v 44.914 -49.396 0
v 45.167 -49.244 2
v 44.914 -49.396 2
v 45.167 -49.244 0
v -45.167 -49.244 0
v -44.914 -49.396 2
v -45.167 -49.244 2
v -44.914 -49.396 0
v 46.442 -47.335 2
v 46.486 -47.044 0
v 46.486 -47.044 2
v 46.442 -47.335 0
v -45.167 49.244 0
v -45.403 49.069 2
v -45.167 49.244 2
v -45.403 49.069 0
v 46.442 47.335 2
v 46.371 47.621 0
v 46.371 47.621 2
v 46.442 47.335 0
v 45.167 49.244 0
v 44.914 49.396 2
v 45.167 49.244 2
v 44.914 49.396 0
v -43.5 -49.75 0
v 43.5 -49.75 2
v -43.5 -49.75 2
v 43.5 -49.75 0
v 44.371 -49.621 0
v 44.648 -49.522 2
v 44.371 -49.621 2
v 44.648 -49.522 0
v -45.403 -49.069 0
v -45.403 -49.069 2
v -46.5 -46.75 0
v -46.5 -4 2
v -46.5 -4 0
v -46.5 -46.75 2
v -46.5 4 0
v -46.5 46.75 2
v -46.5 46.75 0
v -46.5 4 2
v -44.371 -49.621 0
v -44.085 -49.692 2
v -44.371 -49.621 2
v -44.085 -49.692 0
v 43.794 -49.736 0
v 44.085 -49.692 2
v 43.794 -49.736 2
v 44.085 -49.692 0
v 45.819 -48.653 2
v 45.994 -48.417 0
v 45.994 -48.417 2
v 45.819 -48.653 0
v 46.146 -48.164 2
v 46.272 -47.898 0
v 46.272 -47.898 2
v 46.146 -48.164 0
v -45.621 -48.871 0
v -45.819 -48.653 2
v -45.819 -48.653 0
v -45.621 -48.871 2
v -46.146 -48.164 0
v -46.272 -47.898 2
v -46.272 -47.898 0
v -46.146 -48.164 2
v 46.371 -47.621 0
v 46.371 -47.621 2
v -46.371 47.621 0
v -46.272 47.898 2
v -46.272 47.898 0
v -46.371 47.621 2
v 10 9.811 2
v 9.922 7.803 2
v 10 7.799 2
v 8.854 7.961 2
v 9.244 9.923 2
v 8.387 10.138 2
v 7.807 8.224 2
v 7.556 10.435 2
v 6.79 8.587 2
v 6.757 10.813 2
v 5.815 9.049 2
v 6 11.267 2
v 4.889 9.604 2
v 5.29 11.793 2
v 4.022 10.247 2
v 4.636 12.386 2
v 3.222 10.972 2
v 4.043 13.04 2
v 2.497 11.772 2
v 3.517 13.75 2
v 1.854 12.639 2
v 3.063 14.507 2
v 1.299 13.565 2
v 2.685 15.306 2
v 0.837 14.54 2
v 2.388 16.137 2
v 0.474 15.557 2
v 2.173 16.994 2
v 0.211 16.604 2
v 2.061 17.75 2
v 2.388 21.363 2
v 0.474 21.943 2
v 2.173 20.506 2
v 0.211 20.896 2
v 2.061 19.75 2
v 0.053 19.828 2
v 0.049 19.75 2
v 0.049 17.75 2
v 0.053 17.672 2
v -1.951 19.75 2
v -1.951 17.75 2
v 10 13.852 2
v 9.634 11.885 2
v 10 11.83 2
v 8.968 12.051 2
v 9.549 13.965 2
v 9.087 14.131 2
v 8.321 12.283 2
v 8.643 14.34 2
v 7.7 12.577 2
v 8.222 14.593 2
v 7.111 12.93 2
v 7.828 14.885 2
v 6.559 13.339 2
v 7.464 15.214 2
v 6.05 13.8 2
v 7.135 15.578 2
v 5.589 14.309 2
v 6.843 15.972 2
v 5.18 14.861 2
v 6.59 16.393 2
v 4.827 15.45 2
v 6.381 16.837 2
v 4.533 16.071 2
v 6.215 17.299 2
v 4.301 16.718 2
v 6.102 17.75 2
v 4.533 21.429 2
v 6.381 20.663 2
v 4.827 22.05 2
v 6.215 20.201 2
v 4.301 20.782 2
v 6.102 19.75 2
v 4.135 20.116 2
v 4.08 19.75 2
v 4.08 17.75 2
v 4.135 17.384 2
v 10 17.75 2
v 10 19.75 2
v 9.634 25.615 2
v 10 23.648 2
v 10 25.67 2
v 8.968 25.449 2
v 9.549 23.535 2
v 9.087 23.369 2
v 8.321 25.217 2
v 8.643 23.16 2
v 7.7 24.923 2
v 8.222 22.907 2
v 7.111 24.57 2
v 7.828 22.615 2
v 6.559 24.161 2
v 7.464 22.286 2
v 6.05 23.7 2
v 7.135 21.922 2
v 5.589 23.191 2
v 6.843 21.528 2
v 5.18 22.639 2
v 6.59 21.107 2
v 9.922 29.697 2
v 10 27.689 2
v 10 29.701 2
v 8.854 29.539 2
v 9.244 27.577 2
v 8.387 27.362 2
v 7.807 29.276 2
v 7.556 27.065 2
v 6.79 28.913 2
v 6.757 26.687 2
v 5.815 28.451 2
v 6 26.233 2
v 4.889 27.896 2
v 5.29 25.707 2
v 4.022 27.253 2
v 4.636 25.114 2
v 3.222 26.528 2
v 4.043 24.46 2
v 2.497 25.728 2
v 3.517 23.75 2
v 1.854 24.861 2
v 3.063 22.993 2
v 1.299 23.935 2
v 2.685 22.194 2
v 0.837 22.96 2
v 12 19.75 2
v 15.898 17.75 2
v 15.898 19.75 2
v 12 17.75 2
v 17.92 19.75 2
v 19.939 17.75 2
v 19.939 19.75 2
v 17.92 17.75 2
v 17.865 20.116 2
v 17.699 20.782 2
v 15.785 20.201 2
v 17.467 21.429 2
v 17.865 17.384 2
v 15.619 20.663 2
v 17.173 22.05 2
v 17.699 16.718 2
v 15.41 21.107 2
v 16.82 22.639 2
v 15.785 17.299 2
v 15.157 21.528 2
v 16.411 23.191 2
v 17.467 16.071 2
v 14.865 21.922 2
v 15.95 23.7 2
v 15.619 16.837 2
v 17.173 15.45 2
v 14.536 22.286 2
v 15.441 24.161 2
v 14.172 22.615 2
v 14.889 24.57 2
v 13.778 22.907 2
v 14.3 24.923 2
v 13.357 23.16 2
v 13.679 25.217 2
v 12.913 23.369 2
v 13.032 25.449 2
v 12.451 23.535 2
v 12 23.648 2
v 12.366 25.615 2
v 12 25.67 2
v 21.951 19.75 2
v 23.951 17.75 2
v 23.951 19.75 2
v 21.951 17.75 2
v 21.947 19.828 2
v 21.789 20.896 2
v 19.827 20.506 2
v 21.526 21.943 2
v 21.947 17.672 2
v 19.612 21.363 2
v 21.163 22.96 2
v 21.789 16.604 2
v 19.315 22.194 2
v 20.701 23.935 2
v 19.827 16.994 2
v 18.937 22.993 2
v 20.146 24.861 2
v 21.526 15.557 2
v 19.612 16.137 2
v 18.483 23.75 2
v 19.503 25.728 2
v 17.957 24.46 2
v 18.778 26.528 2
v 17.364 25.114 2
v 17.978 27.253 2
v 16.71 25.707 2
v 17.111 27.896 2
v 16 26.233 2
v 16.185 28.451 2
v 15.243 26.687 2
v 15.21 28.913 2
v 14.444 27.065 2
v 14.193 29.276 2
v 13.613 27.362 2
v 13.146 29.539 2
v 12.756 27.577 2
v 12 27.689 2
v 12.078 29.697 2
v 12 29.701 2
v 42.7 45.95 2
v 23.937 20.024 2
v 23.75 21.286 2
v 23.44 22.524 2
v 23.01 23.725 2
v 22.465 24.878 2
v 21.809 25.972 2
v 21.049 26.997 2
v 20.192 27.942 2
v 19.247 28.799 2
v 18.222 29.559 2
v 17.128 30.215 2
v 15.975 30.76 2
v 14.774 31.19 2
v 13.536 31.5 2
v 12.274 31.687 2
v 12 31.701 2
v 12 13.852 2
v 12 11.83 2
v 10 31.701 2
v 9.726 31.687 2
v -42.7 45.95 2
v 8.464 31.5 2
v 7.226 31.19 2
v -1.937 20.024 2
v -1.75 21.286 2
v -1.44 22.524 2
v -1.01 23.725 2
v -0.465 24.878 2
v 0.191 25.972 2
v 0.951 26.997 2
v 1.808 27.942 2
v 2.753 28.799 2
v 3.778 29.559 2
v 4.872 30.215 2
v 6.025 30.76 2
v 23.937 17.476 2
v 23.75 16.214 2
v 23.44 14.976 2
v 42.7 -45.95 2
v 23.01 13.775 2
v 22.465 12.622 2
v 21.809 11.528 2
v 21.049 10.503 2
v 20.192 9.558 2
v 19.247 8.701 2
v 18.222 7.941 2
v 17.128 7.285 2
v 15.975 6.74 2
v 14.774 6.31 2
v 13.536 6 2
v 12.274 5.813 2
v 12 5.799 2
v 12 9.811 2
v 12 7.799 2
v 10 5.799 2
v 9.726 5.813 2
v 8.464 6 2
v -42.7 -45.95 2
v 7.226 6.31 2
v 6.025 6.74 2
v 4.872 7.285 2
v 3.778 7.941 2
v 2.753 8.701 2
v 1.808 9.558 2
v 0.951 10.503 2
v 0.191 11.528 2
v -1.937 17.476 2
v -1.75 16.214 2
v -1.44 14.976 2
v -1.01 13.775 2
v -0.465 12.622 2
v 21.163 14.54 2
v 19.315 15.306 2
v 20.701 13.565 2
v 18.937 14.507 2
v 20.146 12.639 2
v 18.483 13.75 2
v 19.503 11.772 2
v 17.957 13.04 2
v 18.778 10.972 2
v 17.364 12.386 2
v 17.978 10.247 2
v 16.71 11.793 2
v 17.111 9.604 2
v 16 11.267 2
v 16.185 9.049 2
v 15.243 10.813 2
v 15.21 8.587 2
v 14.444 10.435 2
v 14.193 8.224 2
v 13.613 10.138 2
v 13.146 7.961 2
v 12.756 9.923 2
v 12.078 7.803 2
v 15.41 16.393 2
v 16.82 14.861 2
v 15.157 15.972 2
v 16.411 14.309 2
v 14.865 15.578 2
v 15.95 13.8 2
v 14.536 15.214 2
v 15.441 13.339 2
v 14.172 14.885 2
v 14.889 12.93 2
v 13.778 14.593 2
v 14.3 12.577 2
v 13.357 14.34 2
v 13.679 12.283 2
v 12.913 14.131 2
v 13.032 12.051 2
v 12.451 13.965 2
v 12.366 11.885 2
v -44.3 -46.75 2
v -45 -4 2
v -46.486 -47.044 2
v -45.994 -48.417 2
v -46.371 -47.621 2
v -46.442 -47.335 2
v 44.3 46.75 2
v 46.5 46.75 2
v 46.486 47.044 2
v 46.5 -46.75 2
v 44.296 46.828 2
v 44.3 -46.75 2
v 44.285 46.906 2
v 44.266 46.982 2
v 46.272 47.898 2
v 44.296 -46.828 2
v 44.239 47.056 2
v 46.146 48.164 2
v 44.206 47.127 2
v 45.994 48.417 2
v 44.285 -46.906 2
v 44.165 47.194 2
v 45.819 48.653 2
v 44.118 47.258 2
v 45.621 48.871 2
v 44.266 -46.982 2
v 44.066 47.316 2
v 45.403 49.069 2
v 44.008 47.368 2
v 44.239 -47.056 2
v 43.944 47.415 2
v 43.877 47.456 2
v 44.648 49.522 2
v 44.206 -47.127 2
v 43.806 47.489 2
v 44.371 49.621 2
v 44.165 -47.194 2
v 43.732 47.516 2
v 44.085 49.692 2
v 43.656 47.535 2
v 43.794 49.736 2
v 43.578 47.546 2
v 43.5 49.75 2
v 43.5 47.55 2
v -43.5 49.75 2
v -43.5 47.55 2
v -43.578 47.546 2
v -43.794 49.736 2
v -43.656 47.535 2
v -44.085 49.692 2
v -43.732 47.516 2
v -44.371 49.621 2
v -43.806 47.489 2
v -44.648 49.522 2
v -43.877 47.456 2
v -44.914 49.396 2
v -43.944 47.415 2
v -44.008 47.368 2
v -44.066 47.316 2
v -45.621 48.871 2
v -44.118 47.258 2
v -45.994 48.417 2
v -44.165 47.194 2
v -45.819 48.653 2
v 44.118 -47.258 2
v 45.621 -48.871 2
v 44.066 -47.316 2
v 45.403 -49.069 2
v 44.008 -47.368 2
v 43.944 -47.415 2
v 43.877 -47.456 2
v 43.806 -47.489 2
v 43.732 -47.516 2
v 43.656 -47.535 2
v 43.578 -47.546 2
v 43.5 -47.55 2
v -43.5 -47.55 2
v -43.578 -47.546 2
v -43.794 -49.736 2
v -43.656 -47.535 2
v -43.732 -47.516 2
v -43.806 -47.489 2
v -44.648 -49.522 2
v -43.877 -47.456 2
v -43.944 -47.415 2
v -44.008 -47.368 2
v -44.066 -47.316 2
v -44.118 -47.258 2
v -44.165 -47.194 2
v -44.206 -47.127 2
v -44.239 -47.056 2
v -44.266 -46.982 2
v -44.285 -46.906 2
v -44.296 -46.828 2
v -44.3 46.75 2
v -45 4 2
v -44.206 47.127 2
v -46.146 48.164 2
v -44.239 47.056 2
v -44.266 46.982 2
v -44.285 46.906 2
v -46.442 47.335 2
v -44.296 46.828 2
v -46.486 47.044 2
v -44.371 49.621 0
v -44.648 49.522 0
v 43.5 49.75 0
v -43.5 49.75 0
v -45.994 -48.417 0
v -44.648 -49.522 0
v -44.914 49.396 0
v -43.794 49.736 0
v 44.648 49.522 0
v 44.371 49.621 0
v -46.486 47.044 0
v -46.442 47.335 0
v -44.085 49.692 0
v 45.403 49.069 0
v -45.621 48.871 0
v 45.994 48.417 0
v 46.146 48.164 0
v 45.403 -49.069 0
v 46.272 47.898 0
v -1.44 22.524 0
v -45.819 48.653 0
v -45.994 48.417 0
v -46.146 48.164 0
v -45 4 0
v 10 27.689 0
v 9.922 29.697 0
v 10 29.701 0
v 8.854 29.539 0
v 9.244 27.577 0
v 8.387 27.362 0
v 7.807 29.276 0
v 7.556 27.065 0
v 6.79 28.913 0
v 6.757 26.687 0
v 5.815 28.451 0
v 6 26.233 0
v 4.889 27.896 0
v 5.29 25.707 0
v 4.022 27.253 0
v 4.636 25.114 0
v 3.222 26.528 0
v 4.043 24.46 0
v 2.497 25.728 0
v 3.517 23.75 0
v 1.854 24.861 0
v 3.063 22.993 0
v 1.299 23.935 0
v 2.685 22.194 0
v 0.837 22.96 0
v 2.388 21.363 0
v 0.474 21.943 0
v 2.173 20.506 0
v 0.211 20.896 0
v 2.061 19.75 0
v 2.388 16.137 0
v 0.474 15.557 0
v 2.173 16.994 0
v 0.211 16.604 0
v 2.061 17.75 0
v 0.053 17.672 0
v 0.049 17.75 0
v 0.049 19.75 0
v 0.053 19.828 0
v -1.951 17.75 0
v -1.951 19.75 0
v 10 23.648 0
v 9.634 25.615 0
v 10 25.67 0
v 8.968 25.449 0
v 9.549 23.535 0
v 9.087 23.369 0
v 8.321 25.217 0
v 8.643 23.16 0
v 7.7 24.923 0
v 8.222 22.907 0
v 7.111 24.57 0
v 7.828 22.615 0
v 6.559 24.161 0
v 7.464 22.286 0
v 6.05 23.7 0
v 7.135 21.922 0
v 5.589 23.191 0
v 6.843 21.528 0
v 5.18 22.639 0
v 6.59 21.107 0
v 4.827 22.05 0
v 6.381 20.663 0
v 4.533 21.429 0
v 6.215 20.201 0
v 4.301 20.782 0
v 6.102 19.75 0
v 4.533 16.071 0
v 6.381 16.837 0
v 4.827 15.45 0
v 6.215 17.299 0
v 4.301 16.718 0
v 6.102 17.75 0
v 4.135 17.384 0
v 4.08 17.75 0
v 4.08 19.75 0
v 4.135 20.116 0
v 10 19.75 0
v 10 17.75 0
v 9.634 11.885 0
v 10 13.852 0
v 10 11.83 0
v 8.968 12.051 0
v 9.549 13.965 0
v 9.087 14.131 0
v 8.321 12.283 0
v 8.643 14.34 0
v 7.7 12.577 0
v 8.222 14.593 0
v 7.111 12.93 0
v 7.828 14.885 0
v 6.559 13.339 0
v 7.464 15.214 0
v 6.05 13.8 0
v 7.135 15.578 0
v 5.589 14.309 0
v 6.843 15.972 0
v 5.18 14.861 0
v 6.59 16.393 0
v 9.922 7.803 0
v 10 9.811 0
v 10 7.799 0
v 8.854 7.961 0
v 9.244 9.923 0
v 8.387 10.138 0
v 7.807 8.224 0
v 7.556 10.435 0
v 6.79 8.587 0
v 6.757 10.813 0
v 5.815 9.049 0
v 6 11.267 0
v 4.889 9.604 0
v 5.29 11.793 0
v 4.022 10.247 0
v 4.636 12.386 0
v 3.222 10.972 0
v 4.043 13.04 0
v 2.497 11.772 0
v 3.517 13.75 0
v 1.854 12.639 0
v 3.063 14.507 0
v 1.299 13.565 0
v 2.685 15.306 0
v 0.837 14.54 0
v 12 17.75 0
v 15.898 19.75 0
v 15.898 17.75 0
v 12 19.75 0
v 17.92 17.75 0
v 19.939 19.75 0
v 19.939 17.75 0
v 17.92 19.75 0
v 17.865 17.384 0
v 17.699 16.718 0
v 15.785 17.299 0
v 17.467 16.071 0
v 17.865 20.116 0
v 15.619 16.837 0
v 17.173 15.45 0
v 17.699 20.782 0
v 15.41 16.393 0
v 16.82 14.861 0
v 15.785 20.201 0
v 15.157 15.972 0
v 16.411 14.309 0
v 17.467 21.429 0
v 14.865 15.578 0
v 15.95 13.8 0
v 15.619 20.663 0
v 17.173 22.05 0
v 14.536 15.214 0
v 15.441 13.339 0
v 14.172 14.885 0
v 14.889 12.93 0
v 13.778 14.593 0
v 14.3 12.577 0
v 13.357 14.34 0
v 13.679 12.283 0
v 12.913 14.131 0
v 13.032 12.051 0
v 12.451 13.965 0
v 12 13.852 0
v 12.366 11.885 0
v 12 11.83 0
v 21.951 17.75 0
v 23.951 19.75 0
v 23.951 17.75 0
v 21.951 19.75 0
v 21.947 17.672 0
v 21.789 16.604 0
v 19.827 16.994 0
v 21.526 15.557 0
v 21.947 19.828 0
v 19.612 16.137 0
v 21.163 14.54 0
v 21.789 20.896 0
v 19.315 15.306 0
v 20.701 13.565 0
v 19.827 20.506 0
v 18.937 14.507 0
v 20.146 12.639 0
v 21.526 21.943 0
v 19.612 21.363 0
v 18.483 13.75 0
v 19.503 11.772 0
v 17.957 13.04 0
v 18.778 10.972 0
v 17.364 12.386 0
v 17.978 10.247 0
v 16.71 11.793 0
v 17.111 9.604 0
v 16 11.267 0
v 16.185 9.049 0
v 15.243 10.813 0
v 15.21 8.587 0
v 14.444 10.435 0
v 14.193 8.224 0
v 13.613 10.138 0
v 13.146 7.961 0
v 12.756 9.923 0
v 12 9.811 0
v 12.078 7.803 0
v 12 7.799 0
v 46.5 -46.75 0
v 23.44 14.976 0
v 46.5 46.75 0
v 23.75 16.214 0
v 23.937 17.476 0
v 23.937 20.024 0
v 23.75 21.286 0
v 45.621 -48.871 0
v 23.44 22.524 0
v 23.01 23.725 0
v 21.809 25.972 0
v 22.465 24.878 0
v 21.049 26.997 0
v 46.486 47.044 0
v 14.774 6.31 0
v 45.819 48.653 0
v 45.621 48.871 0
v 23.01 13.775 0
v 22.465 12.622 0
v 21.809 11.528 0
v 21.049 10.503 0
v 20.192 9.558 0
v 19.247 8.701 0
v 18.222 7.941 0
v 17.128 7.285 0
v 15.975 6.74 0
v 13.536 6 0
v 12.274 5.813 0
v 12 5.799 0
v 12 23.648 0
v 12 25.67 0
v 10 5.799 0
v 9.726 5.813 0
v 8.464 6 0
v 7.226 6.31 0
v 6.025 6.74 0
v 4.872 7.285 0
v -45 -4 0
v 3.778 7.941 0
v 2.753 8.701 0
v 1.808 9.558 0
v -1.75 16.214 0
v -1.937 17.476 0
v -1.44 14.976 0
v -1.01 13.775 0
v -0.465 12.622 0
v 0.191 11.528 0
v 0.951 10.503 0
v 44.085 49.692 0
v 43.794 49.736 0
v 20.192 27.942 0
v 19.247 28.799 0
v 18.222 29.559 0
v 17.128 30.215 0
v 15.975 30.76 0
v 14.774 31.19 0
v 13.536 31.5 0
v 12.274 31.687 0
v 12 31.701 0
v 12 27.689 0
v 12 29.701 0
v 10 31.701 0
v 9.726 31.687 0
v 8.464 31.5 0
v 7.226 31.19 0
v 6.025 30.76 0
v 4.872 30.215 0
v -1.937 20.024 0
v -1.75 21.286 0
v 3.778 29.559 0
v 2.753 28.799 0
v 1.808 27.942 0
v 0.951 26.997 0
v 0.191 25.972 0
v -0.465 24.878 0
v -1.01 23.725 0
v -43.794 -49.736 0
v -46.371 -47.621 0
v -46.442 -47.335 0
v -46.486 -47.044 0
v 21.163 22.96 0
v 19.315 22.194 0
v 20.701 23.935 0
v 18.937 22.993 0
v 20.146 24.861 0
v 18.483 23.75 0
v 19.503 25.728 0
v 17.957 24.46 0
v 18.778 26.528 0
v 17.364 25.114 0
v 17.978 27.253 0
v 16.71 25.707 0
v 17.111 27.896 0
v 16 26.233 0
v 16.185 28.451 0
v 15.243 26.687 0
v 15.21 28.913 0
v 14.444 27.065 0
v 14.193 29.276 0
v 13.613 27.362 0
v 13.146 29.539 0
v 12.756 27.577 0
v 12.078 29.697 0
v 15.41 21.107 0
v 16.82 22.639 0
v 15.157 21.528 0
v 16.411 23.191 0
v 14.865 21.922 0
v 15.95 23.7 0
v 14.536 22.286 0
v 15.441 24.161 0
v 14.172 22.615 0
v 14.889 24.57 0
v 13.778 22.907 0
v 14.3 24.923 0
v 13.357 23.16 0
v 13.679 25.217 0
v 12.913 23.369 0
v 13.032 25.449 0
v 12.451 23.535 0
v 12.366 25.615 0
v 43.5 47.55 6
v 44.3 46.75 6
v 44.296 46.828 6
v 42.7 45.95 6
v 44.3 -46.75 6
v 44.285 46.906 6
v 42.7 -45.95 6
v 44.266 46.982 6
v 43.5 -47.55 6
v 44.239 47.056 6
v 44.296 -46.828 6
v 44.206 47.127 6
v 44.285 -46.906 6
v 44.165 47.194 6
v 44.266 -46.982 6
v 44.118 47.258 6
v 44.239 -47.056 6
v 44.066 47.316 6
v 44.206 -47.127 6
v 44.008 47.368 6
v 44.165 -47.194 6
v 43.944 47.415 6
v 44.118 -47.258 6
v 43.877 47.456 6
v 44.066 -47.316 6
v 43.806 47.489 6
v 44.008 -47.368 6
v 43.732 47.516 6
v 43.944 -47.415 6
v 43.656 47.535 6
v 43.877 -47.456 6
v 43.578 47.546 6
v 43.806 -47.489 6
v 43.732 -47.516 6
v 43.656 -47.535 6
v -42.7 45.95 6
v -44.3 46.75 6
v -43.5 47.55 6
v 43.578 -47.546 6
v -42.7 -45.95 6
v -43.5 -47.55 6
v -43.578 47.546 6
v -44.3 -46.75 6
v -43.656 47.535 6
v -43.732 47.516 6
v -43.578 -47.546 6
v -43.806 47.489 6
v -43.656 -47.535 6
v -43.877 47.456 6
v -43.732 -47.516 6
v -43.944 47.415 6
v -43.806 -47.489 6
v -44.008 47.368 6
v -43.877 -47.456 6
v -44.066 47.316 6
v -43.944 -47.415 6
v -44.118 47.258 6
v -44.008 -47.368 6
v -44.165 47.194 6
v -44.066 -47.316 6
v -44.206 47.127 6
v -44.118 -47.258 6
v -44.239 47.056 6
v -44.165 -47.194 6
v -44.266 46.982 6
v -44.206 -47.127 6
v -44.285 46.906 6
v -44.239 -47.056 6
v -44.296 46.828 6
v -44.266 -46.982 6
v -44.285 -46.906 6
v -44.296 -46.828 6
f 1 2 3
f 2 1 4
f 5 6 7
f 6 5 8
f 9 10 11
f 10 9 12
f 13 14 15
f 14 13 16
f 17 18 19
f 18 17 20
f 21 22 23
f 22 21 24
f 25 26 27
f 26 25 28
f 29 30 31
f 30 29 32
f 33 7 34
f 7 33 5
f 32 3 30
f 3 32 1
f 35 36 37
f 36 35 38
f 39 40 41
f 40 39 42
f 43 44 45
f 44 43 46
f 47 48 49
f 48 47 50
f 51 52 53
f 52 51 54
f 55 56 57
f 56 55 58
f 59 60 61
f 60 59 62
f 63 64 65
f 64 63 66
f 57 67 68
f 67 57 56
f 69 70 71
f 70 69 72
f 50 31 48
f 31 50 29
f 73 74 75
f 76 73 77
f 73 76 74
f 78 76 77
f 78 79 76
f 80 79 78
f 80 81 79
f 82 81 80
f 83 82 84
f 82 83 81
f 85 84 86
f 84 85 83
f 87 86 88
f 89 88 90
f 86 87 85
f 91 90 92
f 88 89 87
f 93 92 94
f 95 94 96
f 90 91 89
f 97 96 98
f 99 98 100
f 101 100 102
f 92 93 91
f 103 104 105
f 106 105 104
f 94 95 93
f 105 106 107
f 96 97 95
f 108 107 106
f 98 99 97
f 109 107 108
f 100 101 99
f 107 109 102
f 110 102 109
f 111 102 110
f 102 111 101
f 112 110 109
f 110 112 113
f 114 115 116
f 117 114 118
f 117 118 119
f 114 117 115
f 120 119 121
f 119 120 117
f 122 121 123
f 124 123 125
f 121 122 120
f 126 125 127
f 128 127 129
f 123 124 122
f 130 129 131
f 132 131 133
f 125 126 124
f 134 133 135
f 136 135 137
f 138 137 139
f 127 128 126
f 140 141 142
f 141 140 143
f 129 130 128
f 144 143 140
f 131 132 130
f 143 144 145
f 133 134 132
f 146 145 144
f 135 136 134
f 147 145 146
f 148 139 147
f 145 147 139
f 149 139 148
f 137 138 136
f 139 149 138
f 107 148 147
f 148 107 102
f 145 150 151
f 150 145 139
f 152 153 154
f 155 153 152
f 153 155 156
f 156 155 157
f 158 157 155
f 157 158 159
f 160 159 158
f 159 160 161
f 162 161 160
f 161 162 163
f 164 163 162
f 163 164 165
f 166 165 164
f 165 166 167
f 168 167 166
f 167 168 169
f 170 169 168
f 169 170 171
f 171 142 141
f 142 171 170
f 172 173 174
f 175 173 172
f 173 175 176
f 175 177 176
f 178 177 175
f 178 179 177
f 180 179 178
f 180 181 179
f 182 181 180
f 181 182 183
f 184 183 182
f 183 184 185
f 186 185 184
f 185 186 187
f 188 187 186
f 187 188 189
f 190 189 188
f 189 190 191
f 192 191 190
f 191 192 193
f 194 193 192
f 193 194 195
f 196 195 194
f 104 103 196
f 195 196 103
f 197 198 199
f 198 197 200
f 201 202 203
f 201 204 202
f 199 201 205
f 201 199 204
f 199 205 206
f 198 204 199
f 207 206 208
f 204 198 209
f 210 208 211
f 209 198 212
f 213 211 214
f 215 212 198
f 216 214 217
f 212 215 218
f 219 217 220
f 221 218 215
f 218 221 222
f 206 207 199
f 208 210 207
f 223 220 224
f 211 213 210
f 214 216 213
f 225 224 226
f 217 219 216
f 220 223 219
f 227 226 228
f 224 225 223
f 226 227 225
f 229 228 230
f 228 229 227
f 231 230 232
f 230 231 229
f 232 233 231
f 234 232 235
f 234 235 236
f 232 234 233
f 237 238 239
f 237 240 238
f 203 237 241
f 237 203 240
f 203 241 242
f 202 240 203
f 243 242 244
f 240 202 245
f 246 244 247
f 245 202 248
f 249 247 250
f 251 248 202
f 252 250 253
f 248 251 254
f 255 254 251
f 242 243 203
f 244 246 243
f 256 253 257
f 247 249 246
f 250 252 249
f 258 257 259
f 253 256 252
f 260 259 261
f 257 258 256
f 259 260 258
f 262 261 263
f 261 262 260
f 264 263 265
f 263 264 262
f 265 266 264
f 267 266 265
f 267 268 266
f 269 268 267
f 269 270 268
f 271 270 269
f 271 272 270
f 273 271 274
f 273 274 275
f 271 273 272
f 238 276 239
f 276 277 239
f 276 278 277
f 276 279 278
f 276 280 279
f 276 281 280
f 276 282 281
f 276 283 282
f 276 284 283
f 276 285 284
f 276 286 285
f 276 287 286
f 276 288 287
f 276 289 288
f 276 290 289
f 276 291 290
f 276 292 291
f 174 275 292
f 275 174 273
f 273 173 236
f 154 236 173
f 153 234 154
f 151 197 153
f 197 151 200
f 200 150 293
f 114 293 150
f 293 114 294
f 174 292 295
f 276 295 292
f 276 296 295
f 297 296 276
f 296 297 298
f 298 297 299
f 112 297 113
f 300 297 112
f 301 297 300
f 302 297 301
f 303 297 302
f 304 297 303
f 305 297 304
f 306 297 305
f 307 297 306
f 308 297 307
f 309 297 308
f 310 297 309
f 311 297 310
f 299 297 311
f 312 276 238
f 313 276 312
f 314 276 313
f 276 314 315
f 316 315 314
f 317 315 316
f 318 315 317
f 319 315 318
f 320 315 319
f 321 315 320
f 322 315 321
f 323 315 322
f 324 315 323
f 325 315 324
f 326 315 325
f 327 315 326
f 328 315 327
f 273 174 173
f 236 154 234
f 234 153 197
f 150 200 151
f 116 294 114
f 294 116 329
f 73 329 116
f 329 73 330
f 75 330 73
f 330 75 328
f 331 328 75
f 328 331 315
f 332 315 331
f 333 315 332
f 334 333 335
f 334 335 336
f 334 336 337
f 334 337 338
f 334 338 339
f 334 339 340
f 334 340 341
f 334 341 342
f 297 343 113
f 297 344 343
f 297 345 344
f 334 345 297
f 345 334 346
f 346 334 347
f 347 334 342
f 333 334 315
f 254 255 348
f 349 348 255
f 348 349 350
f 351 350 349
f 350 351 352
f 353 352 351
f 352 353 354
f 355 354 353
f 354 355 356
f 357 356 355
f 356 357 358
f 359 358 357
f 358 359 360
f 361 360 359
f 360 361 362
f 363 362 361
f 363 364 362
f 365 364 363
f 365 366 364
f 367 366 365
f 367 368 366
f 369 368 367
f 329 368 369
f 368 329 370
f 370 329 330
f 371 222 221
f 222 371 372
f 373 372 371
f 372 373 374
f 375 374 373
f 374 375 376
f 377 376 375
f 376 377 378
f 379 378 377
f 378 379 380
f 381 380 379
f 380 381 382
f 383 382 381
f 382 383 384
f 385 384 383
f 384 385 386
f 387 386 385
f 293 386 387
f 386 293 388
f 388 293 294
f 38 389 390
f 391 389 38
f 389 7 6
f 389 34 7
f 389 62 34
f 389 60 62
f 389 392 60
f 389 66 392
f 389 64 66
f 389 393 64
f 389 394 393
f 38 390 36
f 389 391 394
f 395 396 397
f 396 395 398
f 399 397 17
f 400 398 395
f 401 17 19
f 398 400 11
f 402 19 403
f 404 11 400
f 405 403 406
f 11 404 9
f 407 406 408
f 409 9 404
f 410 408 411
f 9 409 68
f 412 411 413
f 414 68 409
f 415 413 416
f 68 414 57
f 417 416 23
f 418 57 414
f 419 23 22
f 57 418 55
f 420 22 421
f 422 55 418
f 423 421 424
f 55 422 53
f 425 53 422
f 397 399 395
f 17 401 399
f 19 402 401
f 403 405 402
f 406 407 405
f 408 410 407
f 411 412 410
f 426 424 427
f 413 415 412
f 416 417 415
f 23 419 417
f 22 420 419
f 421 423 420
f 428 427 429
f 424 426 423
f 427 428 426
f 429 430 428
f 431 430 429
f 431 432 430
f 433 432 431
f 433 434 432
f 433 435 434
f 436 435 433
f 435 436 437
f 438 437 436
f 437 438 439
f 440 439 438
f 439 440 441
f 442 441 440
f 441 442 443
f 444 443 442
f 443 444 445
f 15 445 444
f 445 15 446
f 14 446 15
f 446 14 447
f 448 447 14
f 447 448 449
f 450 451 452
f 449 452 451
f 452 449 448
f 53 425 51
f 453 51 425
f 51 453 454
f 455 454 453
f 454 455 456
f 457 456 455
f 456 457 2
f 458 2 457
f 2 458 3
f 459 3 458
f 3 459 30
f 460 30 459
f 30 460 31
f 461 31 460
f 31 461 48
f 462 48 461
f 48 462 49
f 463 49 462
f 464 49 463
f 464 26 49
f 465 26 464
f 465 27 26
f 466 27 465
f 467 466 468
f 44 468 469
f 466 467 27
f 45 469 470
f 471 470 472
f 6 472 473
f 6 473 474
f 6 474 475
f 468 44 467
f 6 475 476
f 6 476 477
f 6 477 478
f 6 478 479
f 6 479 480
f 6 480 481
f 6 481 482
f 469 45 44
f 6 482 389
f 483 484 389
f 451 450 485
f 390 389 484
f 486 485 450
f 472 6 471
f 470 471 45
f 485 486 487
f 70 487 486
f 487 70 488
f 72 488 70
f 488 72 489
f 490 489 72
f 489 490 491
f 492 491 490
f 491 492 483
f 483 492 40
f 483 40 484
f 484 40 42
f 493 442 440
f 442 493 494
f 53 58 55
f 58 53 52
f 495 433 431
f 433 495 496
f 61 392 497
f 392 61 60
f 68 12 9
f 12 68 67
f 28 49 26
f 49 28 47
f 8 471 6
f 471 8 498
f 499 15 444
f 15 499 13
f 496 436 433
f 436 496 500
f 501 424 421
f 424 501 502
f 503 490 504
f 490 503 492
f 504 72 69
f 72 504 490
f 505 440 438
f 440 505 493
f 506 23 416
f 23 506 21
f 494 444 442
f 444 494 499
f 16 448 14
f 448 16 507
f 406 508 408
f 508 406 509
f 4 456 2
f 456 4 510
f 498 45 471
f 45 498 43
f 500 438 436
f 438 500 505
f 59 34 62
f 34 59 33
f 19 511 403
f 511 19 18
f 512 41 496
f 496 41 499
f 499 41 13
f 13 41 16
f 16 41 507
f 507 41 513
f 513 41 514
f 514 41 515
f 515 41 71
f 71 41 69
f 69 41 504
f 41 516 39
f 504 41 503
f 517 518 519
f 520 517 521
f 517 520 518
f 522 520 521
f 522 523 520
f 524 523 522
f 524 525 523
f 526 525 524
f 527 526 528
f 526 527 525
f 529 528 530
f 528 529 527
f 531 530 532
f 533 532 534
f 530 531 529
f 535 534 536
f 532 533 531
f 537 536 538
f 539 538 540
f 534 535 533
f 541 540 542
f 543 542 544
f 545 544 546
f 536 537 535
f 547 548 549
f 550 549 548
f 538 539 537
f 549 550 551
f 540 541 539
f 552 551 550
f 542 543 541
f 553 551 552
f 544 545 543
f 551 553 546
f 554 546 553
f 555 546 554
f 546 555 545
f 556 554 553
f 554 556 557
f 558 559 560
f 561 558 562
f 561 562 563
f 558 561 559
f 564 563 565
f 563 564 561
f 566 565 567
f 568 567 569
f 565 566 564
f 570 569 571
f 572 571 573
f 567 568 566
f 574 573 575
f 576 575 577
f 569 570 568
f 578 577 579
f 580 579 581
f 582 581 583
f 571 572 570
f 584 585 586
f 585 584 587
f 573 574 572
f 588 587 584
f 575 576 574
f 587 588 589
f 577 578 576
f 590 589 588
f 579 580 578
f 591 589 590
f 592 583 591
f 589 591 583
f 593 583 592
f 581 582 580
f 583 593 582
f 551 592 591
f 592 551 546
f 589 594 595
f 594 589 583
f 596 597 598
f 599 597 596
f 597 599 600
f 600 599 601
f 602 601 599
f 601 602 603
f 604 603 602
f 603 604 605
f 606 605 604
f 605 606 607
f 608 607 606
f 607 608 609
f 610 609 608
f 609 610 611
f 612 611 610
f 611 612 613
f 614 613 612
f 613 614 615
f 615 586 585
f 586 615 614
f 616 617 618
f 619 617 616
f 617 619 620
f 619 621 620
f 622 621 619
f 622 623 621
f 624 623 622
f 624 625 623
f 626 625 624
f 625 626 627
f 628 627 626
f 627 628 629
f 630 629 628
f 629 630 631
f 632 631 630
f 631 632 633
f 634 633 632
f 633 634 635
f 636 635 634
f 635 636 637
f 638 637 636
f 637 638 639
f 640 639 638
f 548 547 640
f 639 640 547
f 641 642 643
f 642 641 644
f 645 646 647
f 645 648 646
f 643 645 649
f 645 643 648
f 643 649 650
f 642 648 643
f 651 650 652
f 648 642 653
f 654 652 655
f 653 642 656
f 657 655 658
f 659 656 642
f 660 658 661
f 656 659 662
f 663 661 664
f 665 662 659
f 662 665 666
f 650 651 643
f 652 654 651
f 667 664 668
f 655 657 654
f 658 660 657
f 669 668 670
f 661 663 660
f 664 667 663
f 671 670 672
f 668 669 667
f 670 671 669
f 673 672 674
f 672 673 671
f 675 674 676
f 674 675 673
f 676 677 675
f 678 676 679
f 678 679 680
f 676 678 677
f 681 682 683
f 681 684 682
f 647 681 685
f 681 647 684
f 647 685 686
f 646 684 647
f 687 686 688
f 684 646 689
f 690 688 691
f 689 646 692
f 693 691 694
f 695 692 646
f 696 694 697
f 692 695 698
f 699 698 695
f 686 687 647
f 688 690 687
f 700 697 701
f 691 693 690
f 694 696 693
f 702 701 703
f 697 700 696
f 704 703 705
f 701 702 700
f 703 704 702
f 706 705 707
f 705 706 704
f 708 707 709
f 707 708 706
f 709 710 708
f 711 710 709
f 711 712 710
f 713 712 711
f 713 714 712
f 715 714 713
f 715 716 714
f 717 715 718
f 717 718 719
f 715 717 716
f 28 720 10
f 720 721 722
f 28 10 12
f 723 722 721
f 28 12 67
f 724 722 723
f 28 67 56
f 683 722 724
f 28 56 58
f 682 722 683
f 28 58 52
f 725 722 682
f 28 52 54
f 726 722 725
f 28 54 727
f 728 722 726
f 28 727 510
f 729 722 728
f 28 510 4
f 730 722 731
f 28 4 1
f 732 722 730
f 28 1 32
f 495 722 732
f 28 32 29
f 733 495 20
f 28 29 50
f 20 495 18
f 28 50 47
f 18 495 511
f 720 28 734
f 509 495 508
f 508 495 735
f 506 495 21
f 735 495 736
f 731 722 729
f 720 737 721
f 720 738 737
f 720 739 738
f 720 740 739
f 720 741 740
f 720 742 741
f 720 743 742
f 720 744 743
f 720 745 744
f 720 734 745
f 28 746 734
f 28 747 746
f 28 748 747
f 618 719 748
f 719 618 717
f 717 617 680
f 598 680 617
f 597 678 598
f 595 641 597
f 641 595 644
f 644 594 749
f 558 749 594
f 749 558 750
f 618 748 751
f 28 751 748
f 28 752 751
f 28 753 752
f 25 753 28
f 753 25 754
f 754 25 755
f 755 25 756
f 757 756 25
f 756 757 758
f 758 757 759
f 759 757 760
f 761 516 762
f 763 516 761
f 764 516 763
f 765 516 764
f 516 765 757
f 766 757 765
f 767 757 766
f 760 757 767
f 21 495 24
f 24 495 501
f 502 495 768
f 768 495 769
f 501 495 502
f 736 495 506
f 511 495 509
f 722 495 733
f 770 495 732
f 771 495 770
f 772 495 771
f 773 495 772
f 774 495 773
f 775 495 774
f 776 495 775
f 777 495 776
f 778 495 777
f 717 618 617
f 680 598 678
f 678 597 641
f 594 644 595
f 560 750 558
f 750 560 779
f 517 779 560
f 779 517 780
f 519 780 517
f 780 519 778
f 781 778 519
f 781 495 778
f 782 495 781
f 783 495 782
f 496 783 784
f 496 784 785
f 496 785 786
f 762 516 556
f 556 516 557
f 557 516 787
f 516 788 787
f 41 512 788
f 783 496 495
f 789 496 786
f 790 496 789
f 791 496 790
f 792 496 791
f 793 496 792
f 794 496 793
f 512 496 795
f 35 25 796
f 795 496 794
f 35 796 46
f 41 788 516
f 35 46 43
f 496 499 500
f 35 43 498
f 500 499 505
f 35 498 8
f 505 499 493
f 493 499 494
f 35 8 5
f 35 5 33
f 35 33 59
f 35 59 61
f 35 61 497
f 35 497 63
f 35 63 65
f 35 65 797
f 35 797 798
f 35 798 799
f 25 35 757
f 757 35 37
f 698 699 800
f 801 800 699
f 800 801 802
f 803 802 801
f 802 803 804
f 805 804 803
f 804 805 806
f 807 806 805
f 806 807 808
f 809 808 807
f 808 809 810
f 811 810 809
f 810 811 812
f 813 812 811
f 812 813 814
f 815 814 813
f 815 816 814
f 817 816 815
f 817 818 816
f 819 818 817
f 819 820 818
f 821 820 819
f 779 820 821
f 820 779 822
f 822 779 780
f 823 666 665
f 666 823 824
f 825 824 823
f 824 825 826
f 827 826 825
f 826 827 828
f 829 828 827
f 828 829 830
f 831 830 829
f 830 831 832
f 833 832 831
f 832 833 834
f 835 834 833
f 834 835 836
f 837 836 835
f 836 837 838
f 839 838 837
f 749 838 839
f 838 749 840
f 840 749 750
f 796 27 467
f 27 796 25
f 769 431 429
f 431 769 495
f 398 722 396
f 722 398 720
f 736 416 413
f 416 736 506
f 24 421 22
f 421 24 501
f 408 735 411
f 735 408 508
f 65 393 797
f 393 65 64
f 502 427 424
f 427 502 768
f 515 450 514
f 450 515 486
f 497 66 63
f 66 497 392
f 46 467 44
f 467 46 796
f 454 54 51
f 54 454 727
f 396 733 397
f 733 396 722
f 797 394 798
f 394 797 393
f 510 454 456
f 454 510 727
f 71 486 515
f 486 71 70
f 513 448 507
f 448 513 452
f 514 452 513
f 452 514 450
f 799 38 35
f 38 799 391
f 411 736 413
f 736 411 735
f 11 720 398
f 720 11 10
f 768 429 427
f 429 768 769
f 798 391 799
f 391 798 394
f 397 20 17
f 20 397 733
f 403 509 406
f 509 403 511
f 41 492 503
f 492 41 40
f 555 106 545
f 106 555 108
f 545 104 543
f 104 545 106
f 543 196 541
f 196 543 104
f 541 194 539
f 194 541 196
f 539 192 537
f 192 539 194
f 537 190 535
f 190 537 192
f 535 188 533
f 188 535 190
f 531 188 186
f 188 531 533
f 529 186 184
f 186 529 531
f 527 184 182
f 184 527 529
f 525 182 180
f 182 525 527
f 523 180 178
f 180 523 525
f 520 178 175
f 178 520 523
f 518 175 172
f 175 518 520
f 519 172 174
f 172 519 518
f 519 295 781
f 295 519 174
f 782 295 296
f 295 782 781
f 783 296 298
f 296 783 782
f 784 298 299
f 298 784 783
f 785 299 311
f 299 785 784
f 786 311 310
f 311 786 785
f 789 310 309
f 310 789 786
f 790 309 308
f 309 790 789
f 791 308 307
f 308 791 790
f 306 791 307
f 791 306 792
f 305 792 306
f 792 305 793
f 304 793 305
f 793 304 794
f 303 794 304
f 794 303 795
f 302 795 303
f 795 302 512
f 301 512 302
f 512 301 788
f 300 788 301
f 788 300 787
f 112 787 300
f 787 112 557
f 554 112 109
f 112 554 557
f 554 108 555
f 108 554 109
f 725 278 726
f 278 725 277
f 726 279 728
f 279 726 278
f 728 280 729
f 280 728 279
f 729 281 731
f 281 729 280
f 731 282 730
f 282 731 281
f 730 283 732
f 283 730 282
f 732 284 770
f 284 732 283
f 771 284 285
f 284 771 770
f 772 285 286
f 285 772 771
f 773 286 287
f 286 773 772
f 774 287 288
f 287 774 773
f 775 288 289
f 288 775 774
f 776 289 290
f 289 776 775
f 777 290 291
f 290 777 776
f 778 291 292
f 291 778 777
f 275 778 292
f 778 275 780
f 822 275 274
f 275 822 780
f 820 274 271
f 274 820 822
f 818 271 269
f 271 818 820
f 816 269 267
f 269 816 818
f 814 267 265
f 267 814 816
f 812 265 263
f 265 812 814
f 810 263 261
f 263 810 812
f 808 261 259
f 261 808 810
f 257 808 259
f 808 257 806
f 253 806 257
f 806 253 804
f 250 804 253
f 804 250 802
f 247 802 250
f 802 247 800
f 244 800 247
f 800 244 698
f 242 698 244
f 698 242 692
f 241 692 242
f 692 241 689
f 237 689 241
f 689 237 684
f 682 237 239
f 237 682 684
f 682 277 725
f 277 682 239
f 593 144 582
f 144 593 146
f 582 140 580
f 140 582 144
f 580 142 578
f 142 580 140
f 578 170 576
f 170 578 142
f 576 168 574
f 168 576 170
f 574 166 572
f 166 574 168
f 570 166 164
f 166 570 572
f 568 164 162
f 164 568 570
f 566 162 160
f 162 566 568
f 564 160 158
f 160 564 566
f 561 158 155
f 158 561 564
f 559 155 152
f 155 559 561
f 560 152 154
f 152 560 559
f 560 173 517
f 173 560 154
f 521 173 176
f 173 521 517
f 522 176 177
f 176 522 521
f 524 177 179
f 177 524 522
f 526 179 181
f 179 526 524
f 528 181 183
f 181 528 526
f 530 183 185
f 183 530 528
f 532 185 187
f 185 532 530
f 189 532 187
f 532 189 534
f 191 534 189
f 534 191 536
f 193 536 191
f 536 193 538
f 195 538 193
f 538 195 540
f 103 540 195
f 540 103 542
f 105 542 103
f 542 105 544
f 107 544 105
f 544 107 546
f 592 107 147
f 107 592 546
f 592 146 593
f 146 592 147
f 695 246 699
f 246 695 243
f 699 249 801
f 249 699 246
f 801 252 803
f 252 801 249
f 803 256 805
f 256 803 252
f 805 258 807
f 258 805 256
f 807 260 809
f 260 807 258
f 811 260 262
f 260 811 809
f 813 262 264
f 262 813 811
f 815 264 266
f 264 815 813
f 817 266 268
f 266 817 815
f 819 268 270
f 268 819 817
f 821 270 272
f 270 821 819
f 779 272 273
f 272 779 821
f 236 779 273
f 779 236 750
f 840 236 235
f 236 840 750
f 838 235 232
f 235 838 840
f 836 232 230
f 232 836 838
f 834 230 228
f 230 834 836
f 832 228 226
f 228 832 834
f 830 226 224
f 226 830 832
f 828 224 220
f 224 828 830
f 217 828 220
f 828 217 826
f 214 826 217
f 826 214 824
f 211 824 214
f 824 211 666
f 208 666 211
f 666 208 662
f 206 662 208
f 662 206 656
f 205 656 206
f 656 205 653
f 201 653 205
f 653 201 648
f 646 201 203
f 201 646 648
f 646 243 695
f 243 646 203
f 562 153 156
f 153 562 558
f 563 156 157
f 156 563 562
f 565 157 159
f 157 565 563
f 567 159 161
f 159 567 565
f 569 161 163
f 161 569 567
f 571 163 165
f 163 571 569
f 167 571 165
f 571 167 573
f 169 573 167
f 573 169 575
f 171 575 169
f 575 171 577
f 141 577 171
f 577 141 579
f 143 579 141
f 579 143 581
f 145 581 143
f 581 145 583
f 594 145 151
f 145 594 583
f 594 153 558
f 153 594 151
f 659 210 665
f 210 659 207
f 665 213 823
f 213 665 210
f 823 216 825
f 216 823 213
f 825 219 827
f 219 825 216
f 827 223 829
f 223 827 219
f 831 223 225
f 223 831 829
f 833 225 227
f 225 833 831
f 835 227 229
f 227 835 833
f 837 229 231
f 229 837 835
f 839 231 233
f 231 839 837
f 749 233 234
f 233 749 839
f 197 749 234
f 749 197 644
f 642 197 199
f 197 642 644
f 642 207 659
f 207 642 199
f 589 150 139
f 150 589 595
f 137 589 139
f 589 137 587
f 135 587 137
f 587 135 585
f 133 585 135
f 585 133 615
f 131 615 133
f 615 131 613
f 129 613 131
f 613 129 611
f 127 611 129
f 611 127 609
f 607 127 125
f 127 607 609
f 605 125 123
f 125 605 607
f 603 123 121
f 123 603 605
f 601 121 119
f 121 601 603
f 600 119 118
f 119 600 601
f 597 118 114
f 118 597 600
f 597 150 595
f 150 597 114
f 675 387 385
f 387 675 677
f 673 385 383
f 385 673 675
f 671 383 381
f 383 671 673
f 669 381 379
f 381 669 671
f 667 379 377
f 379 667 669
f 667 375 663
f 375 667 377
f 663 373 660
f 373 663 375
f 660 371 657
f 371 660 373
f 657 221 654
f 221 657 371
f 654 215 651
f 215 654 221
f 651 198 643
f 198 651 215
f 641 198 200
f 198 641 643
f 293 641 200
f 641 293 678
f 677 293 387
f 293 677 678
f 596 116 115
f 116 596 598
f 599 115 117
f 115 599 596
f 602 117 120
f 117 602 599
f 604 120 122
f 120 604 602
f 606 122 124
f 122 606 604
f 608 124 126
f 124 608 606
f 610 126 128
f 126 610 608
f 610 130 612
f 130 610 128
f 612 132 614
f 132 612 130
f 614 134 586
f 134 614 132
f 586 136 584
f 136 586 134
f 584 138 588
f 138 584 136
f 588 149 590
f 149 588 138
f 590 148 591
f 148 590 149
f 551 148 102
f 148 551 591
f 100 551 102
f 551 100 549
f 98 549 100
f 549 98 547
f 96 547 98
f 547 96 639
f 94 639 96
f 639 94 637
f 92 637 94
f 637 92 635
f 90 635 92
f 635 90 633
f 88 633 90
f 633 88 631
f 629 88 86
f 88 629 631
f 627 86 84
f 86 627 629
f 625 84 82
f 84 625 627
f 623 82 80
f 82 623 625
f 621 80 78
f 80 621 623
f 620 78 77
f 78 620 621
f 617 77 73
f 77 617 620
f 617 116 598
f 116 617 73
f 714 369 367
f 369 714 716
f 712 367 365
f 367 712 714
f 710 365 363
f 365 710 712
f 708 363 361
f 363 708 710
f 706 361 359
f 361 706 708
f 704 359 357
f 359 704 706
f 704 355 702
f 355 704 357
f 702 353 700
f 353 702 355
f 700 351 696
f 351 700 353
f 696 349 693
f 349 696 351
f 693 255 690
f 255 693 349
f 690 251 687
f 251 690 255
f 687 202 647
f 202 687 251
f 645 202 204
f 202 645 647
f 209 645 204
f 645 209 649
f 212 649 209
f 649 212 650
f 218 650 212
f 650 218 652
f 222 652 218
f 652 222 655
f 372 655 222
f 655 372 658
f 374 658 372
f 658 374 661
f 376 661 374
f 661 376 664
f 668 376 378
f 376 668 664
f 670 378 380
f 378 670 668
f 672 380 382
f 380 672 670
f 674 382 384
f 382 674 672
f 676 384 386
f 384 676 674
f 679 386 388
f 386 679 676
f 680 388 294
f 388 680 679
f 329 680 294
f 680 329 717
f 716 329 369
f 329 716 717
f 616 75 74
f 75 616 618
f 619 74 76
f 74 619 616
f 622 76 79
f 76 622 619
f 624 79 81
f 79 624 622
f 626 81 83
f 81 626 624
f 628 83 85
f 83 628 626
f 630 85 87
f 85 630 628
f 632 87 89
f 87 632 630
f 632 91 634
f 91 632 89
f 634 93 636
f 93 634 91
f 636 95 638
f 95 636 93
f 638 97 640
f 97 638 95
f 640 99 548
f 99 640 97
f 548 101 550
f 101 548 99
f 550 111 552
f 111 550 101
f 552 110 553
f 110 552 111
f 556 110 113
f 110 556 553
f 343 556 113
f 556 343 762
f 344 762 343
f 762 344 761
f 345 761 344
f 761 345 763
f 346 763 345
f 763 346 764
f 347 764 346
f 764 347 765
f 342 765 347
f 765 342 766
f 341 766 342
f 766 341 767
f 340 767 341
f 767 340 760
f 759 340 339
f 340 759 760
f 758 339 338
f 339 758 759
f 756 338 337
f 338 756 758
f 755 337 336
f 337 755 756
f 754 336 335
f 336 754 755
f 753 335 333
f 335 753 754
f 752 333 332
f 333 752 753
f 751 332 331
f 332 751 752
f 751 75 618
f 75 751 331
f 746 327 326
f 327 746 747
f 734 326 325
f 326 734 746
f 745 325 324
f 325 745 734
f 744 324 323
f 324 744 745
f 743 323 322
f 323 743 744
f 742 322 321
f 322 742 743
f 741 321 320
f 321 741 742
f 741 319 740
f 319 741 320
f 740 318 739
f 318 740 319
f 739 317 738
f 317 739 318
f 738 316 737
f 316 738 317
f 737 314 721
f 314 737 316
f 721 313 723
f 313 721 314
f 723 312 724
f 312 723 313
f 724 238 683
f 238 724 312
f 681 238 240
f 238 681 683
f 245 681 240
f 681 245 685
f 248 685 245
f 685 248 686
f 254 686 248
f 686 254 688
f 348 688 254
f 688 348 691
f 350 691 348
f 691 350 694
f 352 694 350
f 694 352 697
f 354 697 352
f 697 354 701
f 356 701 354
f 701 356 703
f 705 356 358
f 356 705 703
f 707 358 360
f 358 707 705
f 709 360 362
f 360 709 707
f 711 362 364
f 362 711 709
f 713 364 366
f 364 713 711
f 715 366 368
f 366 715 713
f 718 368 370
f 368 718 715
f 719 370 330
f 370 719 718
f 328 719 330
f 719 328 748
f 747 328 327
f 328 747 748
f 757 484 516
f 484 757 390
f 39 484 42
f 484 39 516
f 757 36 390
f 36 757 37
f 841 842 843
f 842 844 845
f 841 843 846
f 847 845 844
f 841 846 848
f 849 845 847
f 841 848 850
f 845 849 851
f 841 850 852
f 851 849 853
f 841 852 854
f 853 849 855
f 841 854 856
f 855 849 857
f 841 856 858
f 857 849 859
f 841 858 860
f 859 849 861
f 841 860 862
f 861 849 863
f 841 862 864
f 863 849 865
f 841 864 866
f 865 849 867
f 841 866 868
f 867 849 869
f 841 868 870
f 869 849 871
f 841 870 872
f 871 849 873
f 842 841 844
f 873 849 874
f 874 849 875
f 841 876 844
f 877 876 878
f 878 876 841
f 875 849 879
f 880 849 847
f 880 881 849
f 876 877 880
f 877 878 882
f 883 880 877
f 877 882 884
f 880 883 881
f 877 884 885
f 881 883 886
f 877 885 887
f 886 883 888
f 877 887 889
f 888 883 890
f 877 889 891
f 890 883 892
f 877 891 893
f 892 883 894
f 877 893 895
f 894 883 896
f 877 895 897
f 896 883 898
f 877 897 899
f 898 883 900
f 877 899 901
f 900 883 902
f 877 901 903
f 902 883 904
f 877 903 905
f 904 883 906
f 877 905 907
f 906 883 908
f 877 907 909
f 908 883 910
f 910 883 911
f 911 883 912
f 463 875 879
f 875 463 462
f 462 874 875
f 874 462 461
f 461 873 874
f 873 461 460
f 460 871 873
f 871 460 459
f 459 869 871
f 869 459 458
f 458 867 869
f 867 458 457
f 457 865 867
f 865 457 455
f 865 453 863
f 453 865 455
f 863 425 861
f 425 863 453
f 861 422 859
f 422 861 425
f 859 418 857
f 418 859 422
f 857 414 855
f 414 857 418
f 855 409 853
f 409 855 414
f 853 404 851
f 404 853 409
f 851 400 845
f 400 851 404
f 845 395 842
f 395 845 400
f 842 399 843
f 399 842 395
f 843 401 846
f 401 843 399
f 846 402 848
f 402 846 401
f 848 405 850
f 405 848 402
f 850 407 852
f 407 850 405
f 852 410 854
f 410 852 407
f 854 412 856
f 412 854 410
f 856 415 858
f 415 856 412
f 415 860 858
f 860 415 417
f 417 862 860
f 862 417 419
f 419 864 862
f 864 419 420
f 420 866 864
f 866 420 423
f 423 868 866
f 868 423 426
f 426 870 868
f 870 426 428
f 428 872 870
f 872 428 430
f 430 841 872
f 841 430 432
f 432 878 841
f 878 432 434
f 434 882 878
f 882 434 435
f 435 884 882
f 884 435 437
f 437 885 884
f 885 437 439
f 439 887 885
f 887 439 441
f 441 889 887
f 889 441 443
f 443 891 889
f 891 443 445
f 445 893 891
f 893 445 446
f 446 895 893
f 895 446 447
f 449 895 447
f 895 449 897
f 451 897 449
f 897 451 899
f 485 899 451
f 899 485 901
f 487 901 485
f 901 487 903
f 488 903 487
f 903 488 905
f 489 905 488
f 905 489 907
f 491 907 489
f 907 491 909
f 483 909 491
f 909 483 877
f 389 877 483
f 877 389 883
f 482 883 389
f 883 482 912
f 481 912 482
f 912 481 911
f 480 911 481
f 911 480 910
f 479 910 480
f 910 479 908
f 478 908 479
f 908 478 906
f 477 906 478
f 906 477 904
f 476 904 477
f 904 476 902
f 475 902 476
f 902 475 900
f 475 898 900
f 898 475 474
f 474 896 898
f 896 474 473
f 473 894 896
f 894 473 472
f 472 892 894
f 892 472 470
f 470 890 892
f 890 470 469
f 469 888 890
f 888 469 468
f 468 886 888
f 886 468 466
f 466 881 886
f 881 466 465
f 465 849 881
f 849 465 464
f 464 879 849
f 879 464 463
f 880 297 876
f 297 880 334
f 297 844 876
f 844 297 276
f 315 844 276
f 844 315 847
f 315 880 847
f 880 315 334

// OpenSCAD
// =============================================================================
//  tutup_pi4b.scad - Tutup (lid) untuk pi4b_camera_enclosure_bottom.stl
// =============================================================================
//  PASANGAN: files\pi4b_camera_enclosure_bottom.stl
//  File itu dibuat oleh files\build_pi4b_enclosure.py. Lid ini terpisah karena
//  pasangan STL-nya sudah final dan tidak memakai params.scad parametric yang
//  lain. JANGAN disamakan dengan enclosure_tutup.scad - itu untuk box parametric
//  yang lebarnya 143,8 mm, jadi produk yang berbeda.
//
//  SUMBER UKURAN
//  Semua angka di bawah diverifikasi langsung ke STL pasangan dan ke script
//  pembuatnya:
//
//    Ukuran STL pasangan (diukur dari vertex) : 93,0 x 99,5 x 40,0 mm
//    INNER_X = PI_W + gap USB + gap SD       = 89,0 mm  (cavitas)
//    INNER_Y = CAM_ZONE + PI_D + BACK_GAP   = 95,5 mm  (cavitas)
//    OUT     = INNER + 2 x WALL              = 93,0 x 99,5 mm
//
//  Jadi "cavity 89 x 95,5" di spec bukan tebakan: itu persis isi script.
//
//  SISTEM KOORDINAT (sama dengan script dan STL pasangan)
//    Kotak berpusat di X/Y, Z = 0 adalah dasar luar box. Rim box ada di z = 40.
//
//  ORIENTASI CETAK
//    Pelat dibaring di meja (z = 0 .. 2), lip ke ATAS (z = 2 .. 6). Semua
//    dinding tegak lurus, jadi aman tanpa support dan tanpa bridge.
//    Untuk menyandingkan dengan STL pasangan di scene yang sama, pakai
//    lid_dalam_koordinat_box() di bawah.
// =============================================================================

$fn = 64;

// =============================================================================
//  PARAMETER (mm) - Spec lid
// =============================================================================
BOX_H            = 40.0;   // tinggi box pasangan, hasil ukur STL
WALL             = 2.0;    // ketebalan dinding box (dari script)

PLAT_LEBAR       = 93.0;   // ukuran pelat luar
PLAT_TINGGI      = 99.5;
PLAT_R           = 3.0;    // radius sudut luar, sebanding dengan dinding box
PLAT_TEBAL       = 2.0;

// Lip (bajul penahan) yang masuk ke cavitas, dikurangi clearance per sisi.
CAV_L            = 89.0;   // cavitas box arah X
CAV_T            = 95.5;   // cavitas box arah Y
LIP_CLR          = 0.2;    // clearance per sisi
LIP_L            = CAV_L - 2 * LIP_CLR;   // 88,6
LIP_T            = CAV_T - 2 * LIP_CLR;   // 95,1
LIP_R            = 0.8;    // radius sudut lip
LIP_DEDAL        = 1.6;    // ketebalan dinding lip
LIP_TINGGI       = 4.0;    // z = 36 .. 40

TOTAL_TINGGI     = PLAT_TEBAL + LIP_TINGGI;   // 6,0 mm

// Takik pembuka (pry notch) untuk ujung obeng, di tepi -X.
NOTIK_PANJANG    = 8.0;    // searah tepi (Y)
NOTIK_DALAM      = 1.5;    // masuk ke arah dalam (X)
NOTIK_Y          = 0.0;    // posisi di tepi -X

// Grid exhaust: busur konsentris seperti grid lantai, di atas SoC.
// Pusat memakai logika gx/gy yang SAMA dengan script (baris 91):
//     gx = bx2X(32.0) = 43,0 - 32,0 = 11,0
//     gy = by2Y(27.0) = 45,75 - 27,0 = 18,75
GRILE_X          = 11.0;
GRILE_Y          = 18.75;
GRILE_DIAMETER   = 26.0;   // diameter total grid (spec)
GRILE_CINCIN     = [[0, 5], [7, 9], [11, 13]];  // (r_dalam, r_luar)
GRILE_LENGAN     = 2.0;    // lebar palang silang yang memotong jadi kuadran

// =============================================================================
//  TURUNAN
// =============================================================================
GRILE_R_LUAR     = GRILE_DIAMETER / 2;        // 13,0
LIP_Z_BOTAS      = BOX_H - LIP_TINGGI;         // 36,0
LIP_Z_ATAS       = BOX_H;                     // 40,0

// Slot ventilasi dinding box paling atas ada di z = 32,5 .. 35,5 (script baris
// 145-147). Lip mulai z = 36, jadi jaraknya 0,5 mm.
VENT_ATAS_BOX    = 35.5;

// =============================================================================
//  MODUL BANTU
// =============================================================================

// Persegi panjang dengan sudut membulat, terpusat di titik asal.
//
// CATATAN: offset(r = +x) MEMBESARKAN benda, bukan hanya membulatkan sudut.
// Kalau ditulis offset(r=3) square([93, 99.5]), hasilnya jadi 99 x 105.5 mm -
// 3 mm lebih besar di tiap sisi. Jadi persegi di dalamnya harus dikecilkan
// 2 x r dulu, sama seperti fungsi rrect() di build_pi4b_enclosure.py.
module profil_rr(w, d, r) {
    offset(r = r)
        square([w - 2 * r, d - 2 * r], center = true);
}

// Grid busur konsentris, dipotong jadi 4 kuadran, seperti grid lantai.
module grid_busur() {
    for (ring = GRILE_CINCIN) {
        r0 = ring[0];
        r1 = ring[1];
        difference() {
            circle(r = r1);
            if (r0 > 0)
                circle(r = r0);
            // Dua palang silang: memotong tiap cincin jadi 4 kuadran.
            square([2 * r1 + 2, GRILE_LENGAN], center = true);
            square([GRILE_LENGAN, 2 * r1 + 2], center = true);
        }
    }
}

// __APPEND_MODULE__

// =============================================================================
//  PELAT
// =============================================================================
module pelat() {
    difference() {
        // Pelat luar, duduk di z = 0 .. PLAT_TEBAL.
        // JANGAN tambah translate z di sini: linear_extrude sudah mulai dari 0.
        linear_extrude(height = PLAT_TEBAL)
            profil_rr(PLAT_LEBAR, PLAT_TINGGI, PLAT_R);

        // Grid exhaust di atas SoC.
        translate([GRILE_X, GRILE_Y, -1])
            linear_extrude(height = PLAT_TEBAL + 2)
                grid_busur();

        // Takik pembuka di tepi -X, untuk ujung obeng. Dipotong penuh
        // setebal pelat supaya obeng bisa mencengkeram tepi dalam.
        translate([-(PLAT_LEBAR / 2) - 1, NOTIK_Y - NOTIK_PANJANG / 2, -1])
            cube([NOTIK_DALAM + 1, NOTIK_PANJANG, PLAT_TEBAL + 2]);
    }
}

// =============================================================================
//  LIP - bajul penahan yang masuk ke cavitas
// =============================================================================
module lip() {
    // z = PLAT_TEBAL .. TOTAL_TINGGI (2 .. 6 saat dicetak).
    translate([0, 0, PLAT_TEBAL])
        linear_extrude(height = LIP_TINGGI)
            difference() {
                profil_rr(LIP_L, LIP_T, LIP_R);
                // offset negatif membuat ketebalan dinding seragam.
                offset(r = -LIP_DEDAL)
                    profil_rr(LIP_L, LIP_T, LIP_R);
            }
}

// =============================================================================
//  RAKITAN
// =============================================================================
module tutup() {
    color("DimGray") pelat();
    color("DimGray") lip();
}

// Versi yang sudah dipindahkan ke koordinat box, supaya bisa langsung
// disandingkan dengan STL pasangan.
//
// PERHATIKAN Z - nilai ini mudah salah, jadi dihitung eksplisit.
//   tutup() (orientasi cetak) occupy z 0..6: pelat z 0..2, lip z 2..6.
//   Spec minta lip di z 36..40 (4 mm masuk ke cavitas) dan pelat di z 40..42
//   (tepat di atas rim box yang ada di z = 40).
//   Karena lip di z 2..6, agar berakhir di 36..40, translate = 36 - 2 = 34.
//
// CATATAN: translate 34 BUKAN 40. Kalau dipakai 40, seluruh lid akan duduk di
// z 40..46, yaitu DI ATAS box, dan lip tidak masuk ke cavitas sama sekali.
module lid_dalam_koordinat_box() {
    translate([0, 0, LIP_Z_BOTAS - PLAT_TEBAL])
        tutup();
}

// =============================================================================
//  VALIDASI
//  Dipakai supaya kesalahan spesifikasi ketahuan saat build, bukan setelah
//  part dicetak.
// =============================================================================
if (abs(PLAT_LEBAR - (CAV_L + 2 * WALL)) > 0.01)
    echo(str("[PERINGATAN] Pelat lebar ", PLAT_LEBAR,
             " tidak sebanding dengan dinding box (", CAV_L, " + 2 x ", WALL,
             " = ", CAV_L + 2 * WALL, "). Pelat akan bolong atau melimpahi."));
if (abs(PLAT_TINGGI - (CAV_T + 2 * WALL)) > 0.01)
    echo(str("[PERINGATAN] Pelat tinggi ", PLAT_TINGGI,
             " tidak sebanding dengan dinding box (", CAV_T, " + 2 x ", WALL,
             " = ", CAV_T + 2 * WALL, ")."));
if (LIP_L > CAV_L || LIP_T > CAV_T)
    echo(str("[PERINGATAN] Lip lebih besar dari cavitas - tidak akan masuk!"));
if (LIP_Z_BOTAS < VENT_ATAS_BOX)
    echo(str("[PERINGATAN] Lip turun sampai z ", LIP_Z_BOTAS,
             " dan akan menutupi slot ventilasi box yang batas atasnya z ",
             VENT_ATAS_BOX, ". Kurangi LIP_TINGGI."));
if (LIP_DEDAL * 2 >= min(LIP_L, LIP_T))
    echo(str("[PERINGATAN] Dinding lip terlalu tebal untuk ukuran lip ini."));
if (GRILE_X - GRILE_R_LUAR < -PLAT_LEBAR / 2 + 1
    || GRILE_X + GRILE_R_LUAR > PLAT_LEBAR / 2 - 1)
    echo(str("[PERINGATAN] Grid keluar dari tepi pelat pada sumbu X."));
if (GRILE_Y - GRILE_R_LUAR < -PLAT_TINGGI / 2 + 1
    || GRILE_Y + GRILE_R_LUAR > PLAT_TINGGI / 2 - 1)
    echo(str("[PERINGATAN] Grid keluar dari tepi pelat pada sumbu Y."));

// Ringkasan dimensi turunan - titik awal saat debug.
echo(str("[LID] pelat ", PLAT_LEBAR, " x ", PLAT_TINGGI, " x ", PLAT_TEBAL,
         " mm | R sudut ", PLAT_R));
echo(str("[LID] lip ", LIP_L, " x ", LIP_T, " x ", LIP_TINGGI, " mm | R ",
         LIP_R, " | dinding ", LIP_DEDAL, " | z ", LIP_Z_BOTAS, " .. ", LIP_Z_ATAS,
         " (jarak dari slot ventilasi ",
         round(LIP_Z_BOTAS - VENT_ATAS_BOX), " mm)"));
echo(str("[LID] total tinggi ", TOTAL_TINGGI, " mm | grid d", GRILE_DIAMETER,
         " @ x=", GRILE_X, " y=", GRILE_Y));

tampilkan_standalone = is_undef(tampilkan_standalone_ov) ? true : tampilkan_standalone_ov;
if (tampilkan_standalone) {
    tutup();
}
